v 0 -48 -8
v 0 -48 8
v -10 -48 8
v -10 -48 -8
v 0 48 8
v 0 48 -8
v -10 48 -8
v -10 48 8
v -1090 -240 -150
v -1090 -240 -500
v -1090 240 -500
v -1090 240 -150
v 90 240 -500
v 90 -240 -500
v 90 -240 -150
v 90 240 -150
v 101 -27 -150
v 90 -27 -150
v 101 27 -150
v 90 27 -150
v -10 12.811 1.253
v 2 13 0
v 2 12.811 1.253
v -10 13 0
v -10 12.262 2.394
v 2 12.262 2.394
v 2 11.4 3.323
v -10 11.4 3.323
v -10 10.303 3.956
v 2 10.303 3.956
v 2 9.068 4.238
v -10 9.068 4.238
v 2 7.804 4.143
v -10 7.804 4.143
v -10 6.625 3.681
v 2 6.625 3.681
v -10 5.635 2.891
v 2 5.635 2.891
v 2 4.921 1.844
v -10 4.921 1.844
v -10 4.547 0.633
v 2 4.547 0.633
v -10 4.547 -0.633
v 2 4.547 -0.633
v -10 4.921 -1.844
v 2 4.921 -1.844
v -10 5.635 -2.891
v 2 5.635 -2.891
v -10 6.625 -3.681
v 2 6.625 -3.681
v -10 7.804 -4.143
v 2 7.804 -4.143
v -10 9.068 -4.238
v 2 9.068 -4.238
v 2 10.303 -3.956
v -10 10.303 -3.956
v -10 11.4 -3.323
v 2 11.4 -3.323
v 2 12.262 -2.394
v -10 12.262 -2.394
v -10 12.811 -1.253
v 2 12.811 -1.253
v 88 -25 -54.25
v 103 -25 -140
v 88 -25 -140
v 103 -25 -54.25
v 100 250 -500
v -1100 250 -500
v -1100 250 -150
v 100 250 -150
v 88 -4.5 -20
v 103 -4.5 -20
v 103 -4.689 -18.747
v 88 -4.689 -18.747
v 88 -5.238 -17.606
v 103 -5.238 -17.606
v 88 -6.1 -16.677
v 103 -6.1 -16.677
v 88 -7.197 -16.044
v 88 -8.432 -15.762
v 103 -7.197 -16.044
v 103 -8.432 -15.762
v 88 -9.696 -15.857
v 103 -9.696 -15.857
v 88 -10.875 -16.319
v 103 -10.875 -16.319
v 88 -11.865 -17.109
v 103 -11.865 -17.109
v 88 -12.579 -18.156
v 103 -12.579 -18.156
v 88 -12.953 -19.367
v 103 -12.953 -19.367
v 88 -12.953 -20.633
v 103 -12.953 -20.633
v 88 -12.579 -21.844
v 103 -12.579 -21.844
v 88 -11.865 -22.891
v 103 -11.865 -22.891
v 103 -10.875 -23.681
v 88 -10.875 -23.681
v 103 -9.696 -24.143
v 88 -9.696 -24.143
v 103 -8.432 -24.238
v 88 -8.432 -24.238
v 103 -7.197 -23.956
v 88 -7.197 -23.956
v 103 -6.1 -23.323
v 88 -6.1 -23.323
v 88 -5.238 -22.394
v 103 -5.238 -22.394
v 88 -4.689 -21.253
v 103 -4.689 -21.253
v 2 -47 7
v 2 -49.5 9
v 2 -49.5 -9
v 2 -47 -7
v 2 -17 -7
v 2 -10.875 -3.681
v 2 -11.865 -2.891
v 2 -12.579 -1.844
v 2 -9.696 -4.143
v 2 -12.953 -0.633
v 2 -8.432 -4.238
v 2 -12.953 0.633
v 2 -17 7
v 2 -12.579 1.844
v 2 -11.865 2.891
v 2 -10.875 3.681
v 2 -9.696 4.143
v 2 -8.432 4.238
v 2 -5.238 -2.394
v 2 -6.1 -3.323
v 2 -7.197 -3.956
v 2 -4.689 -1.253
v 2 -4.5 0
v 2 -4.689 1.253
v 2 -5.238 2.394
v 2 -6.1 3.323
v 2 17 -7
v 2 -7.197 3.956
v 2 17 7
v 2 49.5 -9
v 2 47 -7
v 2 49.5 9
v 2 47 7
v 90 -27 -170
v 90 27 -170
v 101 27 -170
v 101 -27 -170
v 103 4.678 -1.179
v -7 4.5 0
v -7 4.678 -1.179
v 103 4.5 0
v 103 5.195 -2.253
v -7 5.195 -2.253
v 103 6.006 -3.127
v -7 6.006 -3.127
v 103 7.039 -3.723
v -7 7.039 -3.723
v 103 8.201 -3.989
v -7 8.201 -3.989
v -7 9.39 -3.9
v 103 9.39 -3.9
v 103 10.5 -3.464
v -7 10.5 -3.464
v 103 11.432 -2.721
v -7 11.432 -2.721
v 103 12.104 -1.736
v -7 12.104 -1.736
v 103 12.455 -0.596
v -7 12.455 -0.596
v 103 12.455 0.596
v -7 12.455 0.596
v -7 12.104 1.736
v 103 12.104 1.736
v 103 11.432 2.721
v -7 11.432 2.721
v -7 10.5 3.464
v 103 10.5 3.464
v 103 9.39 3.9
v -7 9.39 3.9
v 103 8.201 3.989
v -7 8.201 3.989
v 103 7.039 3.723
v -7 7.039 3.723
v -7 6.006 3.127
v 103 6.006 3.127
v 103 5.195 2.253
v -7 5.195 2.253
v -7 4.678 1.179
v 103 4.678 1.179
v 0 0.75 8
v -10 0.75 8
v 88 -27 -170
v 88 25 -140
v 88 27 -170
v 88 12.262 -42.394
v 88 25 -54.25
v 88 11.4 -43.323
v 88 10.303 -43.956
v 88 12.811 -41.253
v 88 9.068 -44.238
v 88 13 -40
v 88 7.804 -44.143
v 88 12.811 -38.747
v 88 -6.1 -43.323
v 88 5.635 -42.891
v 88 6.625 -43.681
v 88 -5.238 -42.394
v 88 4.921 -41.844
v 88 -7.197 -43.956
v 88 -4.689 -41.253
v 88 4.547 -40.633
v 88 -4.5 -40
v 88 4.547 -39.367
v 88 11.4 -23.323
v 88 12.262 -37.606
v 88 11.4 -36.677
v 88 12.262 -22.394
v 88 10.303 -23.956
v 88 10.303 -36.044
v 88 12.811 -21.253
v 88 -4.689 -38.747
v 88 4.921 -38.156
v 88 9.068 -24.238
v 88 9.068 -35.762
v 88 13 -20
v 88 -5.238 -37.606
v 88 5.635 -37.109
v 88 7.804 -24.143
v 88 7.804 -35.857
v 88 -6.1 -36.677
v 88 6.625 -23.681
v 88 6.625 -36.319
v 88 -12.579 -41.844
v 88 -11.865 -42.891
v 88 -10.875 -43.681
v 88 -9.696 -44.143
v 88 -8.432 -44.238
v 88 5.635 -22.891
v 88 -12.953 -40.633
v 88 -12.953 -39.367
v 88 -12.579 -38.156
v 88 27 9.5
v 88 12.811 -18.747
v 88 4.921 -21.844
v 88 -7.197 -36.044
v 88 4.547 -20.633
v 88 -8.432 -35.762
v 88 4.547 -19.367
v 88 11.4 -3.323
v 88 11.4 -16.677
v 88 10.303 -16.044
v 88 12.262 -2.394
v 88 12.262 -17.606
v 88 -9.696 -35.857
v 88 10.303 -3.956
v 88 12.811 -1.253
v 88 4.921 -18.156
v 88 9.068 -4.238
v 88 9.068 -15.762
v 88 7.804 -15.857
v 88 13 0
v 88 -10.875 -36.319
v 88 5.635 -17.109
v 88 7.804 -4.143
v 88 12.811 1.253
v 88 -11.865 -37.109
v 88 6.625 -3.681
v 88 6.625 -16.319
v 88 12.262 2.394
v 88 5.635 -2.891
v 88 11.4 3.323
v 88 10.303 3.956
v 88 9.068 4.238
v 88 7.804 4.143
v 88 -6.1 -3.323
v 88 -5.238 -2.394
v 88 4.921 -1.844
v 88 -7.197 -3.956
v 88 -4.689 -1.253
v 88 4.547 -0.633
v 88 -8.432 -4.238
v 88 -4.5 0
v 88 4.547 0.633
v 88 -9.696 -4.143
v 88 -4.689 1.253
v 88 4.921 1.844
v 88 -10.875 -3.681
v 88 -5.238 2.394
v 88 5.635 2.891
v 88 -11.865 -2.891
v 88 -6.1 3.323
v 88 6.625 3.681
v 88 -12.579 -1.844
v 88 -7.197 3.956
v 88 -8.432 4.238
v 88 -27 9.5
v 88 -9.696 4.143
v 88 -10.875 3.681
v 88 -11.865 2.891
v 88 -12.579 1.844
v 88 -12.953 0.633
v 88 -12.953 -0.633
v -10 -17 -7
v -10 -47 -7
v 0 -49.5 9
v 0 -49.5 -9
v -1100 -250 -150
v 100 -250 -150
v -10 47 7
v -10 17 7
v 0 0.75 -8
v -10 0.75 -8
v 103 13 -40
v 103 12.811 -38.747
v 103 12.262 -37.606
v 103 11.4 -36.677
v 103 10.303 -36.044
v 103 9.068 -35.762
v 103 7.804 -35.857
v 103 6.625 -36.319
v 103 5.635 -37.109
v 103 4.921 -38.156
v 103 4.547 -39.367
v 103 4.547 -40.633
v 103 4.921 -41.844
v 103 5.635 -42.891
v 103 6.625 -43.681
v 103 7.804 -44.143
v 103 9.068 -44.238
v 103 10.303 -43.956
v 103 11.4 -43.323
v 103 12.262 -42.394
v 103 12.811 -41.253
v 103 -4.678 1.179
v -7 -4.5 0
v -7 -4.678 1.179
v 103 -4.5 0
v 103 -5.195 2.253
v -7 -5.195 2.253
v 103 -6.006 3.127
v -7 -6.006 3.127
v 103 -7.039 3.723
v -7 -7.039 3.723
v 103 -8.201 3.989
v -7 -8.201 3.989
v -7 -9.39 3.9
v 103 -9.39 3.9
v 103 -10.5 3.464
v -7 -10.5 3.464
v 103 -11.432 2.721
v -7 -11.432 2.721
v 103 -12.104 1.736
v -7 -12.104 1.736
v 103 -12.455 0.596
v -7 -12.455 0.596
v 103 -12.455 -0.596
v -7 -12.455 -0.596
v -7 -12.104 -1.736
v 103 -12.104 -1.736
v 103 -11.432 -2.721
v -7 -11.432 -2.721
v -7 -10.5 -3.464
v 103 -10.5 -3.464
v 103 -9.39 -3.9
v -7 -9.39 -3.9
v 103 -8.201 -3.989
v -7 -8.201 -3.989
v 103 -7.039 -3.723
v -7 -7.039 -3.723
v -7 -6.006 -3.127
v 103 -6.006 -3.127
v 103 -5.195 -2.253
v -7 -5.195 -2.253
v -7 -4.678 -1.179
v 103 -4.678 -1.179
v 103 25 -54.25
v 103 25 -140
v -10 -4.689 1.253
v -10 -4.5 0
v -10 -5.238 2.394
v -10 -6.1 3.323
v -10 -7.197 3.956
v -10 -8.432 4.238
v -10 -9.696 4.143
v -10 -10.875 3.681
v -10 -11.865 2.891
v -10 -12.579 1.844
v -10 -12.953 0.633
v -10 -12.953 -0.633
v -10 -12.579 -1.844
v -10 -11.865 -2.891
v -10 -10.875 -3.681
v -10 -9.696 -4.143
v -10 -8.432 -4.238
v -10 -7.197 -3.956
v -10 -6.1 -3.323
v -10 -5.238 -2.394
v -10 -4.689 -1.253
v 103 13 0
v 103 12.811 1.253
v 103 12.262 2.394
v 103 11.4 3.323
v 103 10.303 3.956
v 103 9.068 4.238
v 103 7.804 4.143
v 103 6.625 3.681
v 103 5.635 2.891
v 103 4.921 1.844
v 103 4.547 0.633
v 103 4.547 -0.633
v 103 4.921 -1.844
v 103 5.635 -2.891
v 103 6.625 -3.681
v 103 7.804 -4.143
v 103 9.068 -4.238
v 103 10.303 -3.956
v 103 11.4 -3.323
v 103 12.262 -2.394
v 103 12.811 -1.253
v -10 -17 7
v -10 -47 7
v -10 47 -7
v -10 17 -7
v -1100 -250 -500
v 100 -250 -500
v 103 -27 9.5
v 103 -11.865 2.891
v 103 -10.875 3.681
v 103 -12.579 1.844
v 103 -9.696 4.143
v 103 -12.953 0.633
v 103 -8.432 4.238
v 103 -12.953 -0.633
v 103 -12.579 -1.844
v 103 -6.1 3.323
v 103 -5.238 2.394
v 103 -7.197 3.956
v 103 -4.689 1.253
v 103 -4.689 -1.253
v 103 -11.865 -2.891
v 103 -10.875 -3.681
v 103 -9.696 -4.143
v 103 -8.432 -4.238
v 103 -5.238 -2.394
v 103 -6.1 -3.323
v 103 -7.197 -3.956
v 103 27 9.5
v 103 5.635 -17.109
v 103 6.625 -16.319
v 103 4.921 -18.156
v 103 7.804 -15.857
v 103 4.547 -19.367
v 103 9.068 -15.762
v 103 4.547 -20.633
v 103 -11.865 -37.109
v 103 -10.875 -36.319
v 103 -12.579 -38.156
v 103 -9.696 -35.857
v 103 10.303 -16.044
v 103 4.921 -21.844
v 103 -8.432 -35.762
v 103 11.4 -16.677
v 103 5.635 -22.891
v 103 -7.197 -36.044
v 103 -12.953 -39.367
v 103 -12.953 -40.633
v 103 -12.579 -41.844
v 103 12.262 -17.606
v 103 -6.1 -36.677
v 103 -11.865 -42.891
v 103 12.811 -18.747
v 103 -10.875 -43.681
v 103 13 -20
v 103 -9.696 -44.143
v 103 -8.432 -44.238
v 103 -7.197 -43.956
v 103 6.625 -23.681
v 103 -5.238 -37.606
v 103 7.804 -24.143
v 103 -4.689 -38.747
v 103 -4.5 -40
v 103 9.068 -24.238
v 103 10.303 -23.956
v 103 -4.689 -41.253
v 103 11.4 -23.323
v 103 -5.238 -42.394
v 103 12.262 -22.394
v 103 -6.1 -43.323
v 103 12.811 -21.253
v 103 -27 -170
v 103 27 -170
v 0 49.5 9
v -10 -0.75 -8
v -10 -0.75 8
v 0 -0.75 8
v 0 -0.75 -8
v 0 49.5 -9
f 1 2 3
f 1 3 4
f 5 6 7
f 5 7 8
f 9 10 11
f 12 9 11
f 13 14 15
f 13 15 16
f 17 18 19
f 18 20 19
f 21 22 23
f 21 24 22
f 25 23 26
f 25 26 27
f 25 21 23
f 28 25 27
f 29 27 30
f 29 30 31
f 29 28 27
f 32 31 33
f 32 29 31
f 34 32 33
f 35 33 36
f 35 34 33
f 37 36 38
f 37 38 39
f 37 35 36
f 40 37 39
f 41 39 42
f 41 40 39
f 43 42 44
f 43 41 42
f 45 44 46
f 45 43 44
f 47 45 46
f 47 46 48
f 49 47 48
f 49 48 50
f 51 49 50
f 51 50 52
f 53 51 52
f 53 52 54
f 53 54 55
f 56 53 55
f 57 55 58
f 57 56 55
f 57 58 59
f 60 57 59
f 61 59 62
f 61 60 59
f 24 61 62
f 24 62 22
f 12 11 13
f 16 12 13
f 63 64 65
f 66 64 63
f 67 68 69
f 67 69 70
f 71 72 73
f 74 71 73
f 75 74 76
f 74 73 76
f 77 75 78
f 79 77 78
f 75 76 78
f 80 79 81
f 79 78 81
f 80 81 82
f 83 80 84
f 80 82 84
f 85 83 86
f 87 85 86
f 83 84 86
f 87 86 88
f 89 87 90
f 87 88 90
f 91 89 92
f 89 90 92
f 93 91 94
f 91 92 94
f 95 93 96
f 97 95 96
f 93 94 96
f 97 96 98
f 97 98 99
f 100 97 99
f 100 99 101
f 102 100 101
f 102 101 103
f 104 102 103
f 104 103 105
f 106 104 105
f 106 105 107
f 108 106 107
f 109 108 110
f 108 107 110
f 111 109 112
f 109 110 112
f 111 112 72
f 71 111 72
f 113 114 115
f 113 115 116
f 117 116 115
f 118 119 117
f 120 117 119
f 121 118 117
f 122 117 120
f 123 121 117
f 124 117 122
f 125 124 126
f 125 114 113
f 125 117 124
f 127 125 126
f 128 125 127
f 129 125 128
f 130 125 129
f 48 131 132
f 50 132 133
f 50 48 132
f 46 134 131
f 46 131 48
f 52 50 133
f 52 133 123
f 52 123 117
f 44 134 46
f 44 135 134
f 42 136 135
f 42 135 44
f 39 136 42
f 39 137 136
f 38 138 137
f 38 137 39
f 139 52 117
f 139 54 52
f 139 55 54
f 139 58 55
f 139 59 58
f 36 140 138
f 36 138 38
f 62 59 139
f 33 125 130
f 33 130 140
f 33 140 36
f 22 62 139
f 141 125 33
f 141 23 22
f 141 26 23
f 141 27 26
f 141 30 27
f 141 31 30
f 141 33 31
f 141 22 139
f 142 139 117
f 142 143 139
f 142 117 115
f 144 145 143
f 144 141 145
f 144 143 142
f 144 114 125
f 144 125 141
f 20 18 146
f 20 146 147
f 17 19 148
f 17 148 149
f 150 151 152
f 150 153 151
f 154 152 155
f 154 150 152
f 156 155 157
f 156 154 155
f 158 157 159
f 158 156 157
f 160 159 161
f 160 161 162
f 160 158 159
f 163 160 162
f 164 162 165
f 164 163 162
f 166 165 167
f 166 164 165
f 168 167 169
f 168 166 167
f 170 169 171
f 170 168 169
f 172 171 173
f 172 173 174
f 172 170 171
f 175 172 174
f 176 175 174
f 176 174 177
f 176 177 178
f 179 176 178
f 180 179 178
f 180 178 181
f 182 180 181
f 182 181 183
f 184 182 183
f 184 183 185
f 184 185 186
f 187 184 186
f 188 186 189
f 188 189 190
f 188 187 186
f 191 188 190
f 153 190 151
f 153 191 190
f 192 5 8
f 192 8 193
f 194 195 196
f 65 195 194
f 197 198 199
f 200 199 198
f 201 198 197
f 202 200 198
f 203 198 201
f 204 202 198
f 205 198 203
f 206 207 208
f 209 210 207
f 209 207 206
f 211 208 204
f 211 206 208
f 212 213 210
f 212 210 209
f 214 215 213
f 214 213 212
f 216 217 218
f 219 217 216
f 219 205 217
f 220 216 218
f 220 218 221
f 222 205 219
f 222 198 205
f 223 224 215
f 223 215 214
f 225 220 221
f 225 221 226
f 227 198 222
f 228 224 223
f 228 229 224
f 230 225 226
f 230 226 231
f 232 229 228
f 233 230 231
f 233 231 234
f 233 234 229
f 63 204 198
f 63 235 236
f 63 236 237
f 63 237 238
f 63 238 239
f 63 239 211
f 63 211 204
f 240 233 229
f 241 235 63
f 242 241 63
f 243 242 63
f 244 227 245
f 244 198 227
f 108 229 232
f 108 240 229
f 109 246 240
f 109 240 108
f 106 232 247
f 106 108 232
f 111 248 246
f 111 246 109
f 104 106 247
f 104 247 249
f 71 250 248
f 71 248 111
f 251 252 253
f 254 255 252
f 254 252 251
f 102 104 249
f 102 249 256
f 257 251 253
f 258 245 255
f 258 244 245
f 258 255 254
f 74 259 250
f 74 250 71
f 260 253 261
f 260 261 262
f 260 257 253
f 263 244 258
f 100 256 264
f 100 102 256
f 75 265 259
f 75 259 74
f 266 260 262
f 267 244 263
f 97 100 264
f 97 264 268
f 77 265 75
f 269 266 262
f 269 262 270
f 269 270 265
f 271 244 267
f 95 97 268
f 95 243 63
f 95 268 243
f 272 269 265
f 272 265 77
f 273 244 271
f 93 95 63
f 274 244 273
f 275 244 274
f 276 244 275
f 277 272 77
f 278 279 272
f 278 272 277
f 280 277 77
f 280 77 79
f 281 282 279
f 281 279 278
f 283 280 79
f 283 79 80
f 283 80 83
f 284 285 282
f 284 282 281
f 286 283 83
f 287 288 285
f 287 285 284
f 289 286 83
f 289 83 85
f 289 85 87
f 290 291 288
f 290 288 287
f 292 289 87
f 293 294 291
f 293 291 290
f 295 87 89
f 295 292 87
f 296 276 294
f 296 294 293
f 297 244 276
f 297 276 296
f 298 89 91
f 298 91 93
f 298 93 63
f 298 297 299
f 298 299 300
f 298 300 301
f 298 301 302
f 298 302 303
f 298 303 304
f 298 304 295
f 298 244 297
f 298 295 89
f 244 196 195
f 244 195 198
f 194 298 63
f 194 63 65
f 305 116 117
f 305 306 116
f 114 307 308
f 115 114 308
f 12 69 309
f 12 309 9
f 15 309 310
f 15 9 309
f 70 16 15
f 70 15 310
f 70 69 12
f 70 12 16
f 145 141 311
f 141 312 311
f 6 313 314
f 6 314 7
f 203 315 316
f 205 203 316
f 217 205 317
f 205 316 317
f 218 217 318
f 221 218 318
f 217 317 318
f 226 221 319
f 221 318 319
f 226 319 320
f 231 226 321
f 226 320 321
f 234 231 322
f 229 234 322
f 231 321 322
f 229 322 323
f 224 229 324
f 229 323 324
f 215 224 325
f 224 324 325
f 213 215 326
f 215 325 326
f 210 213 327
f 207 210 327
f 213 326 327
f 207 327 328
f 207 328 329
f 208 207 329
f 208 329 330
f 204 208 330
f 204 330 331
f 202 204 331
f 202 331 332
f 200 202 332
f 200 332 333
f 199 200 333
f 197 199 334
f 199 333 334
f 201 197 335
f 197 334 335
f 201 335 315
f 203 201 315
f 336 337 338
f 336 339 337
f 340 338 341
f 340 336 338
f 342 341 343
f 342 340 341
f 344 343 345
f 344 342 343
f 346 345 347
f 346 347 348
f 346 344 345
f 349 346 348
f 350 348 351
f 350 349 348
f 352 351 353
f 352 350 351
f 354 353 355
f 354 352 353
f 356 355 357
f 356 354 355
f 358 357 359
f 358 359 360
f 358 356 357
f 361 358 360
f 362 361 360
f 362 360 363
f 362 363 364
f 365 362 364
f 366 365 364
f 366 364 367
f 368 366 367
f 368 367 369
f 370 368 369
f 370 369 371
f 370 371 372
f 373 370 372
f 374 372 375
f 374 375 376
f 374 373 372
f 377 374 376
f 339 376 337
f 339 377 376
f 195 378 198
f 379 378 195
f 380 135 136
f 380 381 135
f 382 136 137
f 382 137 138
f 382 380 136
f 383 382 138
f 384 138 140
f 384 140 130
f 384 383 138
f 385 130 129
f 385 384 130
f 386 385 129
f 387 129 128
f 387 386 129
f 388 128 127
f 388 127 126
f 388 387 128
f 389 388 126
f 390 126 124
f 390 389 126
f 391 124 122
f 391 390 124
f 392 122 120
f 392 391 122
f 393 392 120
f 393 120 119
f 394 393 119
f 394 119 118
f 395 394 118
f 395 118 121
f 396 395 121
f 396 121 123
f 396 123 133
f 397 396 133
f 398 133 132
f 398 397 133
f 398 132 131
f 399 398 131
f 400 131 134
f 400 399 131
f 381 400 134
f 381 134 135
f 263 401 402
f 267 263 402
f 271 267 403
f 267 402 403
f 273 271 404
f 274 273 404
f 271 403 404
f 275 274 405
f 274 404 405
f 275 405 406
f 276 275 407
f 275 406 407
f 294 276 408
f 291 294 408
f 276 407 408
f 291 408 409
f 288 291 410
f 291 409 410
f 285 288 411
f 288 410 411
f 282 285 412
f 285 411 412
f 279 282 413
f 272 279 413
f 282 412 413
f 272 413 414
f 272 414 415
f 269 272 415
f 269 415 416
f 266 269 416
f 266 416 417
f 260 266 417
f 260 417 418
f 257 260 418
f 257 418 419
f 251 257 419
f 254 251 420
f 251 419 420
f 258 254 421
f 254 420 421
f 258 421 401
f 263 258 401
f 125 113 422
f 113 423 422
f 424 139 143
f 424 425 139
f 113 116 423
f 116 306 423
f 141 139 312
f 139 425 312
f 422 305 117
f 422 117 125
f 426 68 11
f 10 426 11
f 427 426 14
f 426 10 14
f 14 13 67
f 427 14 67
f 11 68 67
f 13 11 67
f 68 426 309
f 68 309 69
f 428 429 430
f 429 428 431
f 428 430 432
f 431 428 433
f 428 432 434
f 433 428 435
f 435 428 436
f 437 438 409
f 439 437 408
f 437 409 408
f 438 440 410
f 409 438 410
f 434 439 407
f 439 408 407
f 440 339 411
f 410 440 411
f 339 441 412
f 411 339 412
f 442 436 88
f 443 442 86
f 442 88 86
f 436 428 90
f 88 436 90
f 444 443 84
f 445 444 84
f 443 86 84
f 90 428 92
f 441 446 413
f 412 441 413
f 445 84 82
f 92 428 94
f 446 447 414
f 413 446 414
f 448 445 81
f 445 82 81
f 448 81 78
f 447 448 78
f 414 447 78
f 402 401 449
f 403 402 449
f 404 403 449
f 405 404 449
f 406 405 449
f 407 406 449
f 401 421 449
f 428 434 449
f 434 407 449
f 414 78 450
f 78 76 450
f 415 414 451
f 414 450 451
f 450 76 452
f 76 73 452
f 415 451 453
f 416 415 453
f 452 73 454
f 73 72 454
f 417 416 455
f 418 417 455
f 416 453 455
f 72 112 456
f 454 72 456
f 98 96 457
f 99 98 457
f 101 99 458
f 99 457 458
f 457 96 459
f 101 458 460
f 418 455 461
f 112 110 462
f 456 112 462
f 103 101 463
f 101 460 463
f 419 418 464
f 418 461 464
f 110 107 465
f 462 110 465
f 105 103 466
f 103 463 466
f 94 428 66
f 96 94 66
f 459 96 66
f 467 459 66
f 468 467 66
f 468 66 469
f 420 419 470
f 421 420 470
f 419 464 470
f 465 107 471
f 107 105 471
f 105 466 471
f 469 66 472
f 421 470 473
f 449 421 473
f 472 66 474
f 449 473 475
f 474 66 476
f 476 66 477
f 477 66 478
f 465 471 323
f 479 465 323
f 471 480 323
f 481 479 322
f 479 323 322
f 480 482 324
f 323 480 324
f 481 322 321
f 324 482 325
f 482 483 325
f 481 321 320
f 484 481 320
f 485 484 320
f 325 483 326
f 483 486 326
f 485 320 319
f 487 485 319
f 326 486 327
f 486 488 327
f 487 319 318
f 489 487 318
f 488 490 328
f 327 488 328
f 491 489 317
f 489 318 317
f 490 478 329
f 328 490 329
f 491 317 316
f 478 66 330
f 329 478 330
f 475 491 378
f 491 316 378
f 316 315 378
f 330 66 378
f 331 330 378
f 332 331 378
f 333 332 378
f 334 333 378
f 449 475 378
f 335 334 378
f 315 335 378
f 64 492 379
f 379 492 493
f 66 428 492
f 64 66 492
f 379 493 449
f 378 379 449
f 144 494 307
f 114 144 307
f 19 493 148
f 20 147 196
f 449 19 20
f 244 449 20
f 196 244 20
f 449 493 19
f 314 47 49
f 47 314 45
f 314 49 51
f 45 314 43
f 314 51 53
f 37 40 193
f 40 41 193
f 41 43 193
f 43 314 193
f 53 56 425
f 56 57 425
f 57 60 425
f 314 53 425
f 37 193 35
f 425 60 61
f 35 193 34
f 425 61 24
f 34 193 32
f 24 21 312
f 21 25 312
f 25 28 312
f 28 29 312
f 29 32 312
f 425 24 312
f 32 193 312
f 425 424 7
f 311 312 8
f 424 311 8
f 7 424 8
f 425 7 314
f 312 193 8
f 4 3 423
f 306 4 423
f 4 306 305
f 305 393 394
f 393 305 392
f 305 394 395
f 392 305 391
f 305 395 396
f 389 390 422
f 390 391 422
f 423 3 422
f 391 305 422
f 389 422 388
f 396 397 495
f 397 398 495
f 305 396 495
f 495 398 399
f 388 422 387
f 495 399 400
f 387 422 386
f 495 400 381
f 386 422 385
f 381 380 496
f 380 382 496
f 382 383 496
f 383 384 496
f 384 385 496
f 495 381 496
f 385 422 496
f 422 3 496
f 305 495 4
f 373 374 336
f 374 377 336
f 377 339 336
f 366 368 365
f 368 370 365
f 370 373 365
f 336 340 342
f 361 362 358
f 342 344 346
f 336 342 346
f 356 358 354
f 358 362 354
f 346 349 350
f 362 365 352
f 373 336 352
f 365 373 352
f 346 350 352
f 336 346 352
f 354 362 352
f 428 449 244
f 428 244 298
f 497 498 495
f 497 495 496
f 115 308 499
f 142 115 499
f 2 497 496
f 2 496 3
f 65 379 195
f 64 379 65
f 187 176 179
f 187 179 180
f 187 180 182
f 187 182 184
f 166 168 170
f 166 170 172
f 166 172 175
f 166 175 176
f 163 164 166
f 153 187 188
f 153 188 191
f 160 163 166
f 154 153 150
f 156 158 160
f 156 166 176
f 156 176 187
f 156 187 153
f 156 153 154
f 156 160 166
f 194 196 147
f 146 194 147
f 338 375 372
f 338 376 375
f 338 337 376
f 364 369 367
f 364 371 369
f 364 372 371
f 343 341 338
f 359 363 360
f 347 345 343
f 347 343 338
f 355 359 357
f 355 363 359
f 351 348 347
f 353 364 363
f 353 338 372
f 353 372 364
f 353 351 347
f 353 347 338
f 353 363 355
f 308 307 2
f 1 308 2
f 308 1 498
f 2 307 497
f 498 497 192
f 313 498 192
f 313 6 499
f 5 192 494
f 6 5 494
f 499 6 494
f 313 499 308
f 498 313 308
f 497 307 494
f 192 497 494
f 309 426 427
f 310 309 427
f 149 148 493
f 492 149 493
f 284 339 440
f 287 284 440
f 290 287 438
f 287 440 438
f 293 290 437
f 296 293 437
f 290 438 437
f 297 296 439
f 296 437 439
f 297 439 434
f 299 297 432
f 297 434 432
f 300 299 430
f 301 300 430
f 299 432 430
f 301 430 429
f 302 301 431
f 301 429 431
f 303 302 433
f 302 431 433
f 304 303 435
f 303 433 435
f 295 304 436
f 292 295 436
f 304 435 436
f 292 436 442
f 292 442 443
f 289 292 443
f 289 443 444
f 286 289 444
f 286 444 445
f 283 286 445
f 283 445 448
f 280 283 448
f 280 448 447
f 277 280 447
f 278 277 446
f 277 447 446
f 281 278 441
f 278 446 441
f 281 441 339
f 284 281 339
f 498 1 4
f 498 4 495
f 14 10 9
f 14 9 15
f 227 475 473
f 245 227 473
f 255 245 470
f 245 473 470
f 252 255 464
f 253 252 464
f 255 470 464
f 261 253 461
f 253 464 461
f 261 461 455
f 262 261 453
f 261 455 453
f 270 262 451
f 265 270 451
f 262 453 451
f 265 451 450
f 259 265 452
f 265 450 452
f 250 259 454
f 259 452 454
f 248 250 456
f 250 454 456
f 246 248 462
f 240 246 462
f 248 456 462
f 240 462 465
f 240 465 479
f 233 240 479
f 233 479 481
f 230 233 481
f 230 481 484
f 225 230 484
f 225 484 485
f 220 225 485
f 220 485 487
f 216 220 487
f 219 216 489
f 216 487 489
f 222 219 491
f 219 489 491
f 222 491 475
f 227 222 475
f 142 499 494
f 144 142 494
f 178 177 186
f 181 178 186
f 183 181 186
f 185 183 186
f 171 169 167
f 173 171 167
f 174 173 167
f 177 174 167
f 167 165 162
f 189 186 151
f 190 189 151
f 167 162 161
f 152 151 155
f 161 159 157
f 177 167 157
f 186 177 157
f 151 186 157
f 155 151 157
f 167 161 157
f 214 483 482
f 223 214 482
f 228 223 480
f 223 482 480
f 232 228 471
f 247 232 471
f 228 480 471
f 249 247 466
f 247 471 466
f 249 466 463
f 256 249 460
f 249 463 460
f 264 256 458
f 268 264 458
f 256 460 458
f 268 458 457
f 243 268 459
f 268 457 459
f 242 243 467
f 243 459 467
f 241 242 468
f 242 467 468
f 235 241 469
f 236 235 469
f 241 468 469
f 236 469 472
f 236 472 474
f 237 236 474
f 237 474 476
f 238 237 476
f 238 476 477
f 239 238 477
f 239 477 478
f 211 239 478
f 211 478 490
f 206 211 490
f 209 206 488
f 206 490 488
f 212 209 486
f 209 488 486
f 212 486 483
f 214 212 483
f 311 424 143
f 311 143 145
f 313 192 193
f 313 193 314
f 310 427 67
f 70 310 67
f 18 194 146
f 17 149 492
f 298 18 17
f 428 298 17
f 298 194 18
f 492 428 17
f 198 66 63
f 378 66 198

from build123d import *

# Parameters (mm, degrees)
F0_W          = 1.5
F0_H          = 1
F0_H_2        = 16
F0_R          = 4.25
F0_W_2        = 30
F0_H_3        = 14
F1_DEPTH      = 2
F2_DEPTH      = 10
F2_DEPTH_BACK = 2
F5_W          = 1200
F5_H          = 500
F5_W_2        = 1180
F5_H_2        = 480
F6_DEPTH      = 350
F8_W          = 10
F8_H          = 2
F8_W_2        = 1
F8_H_2        = 50
F9_DEPTH      = 10
F10_DEPTH     = 20
F11_R         = 4.25
F12_DEPTH     = 15
F13_W         = 110
F13_H         = 4


# Not quite as in the source:
# - a feature names something its author has since deleted; it is built from what else it names
# - the program builds the solid bodies; features that only make, move or delete a surface that nothing else refers to are left out


with BuildPart() as f1:
    # F0 (on Right) → F1 (new body)
    with BuildSketch(Plane.YZ):
        Polygon((-0.75, 9), (-49.5, 9), (-49.5, -9), (-0.75, -9), (-0.75, -8), (-13, -8), (-16, -8), (-48, -8), (-48, 8), (-16, 8), (-13, 8), (-0.75, 8), align=None)
        with Locations((0, 8.5)):
            Rectangle(F0_W, F0_H)
        Polygon((49.5, 9), (0.75, 9), (0.75, 8), (13, 8), (16, 8), (48, 8), (48, -8), (16, -8), (13, -8), (0.75, -8), (0.75, -9), (49.5, -9), align=None)
        with Locations((0, -8.5)):
            Rectangle(F0_W, F0_H)
        Rectangle(F0_W, F0_H_2)
        Polygon((13, 8), (0.75, 8), (0.75, -8), (13, -8), (16, -8), (48, -8), (48, 8), (16, 8), align=None)
        with Locations((8.75, 0)):
            Circle(F0_R, mode=Mode.SUBTRACT)
        with Locations((32, 0)):
            Rectangle(F0_W_2, F0_H_3, mode=Mode.SUBTRACT)
    extrude(amount=F1_DEPTH)

    # F0 (on Right) → F2 (join, two sides)
    with BuildSketch(Plane.YZ) as f2_sk:
        Polygon((-0.75, -8), (-0.75, 8), (-13, 8), (-16, 8), (-48, 8), (-48, -8), (-16, -8), (-13, -8), align=None)
        with Locations((-32, 0)):
            Rectangle(F0_W_2, F0_H_3, mode=Mode.SUBTRACT)
        with Locations((-8.75, 0)):
            Circle(F0_R, mode=Mode.SUBTRACT)
        Polygon((13, 8), (0.75, 8), (0.75, -8), (13, -8), (16, -8), (48, -8), (48, 8), (16, 8), align=None)
        with Locations((8.75, 0)):
            Circle(F0_R, mode=Mode.SUBTRACT)
        with Locations((32, 0)):
            Rectangle(F0_W_2, F0_H_3, mode=Mode.SUBTRACT)
    extrude(amount=-F2_DEPTH)
    extrude(f2_sk.sketch, amount=F2_DEPTH_BACK)


with BuildPart() as f6:
    # F5 (on offset) → F6 (new body)
    with BuildSketch(Plane.XY.offset(-500)):
        with Locations((-500, 0)):
            Rectangle(F5_W, F5_H)
        with Locations((-500, 0)):
            Rectangle(F5_W_2, F5_H_2, mode=Mode.SUBTRACT)
    extrude(amount=F6_DEPTH)


with BuildPart() as f9:
    # F8 (on face) → F9 (new body)
    with BuildSketch(Plane.XY.offset(-150)):
        Polygon((101, 27), (101, 25), (101, -25), (101, -27), (103, -27), (103, 27), align=None)
        Polygon((90, -25), (90, 25), (90, 27), (88, 27), (88, -27), (90, -27), align=None)
        with Locations((95, 26)):
            Rectangle(F8_W, F8_H)
        with Locations((100.5, 26)):
            Rectangle(F8_W_2, F8_H)
        with Locations((100.5, -26)):
            Rectangle(F8_W_2, F8_H)
        with Locations((95, -26)):
            Rectangle(F8_W, F8_H)
        with Locations((100.5, 0)):
            Rectangle(F8_W_2, F8_H_2)
        with Locations((95, 0)):
            Rectangle(F8_W, F8_H_2)
    extrude(amount=F9_DEPTH)

    # F8 (on face) → F10 (join)
    with BuildSketch(Plane.XY.offset(-150)):
        Polygon((90, -25), (90, 25), (90, 27), (88, 27), (88, -27), (90, -27), align=None)
        Polygon((101, 27), (101, 25), (101, -25), (101, -27), (103, -27), (103, 27), align=None)
    extrude(amount=-F10_DEPTH)

    # F11 (on face) → F12 (join)
    with BuildSketch(Plane.YZ.offset(103)):
        Polygon((-25, -140), (-27, -140), (-27, -150), (27, -150), (27, -140), (25, -140), align=None)
        Polygon((-27, 9.5), (-27, -140), (-25, -140), (-25, -54.25), (25, -54.25), (25, -140), (27, -140), (27, 9.5), align=None)
        with Locations((-8.75, -40)):
            Circle(F11_R, mode=Mode.SUBTRACT)
        with Locations((-8.75, -20)):
            Circle(F11_R, mode=Mode.SUBTRACT)
        with Locations((-8.75, 0)):
            Circle(F11_R, mode=Mode.SUBTRACT)
        with Locations((8.75, -40)):
            Circle(F11_R, mode=Mode.SUBTRACT)
        with Locations((8.75, -20)):
            Circle(F11_R, mode=Mode.SUBTRACT)
        with Locations((8.75, 0)):
            Circle(F11_R, mode=Mode.SUBTRACT)
    extrude(amount=-F12_DEPTH)


with BuildPart() as f14:
    # F13 (on Top) → F14 (revolve)
    with BuildSketch(Plane.XY):
        with Locations((48, -6.5)):
            Rectangle(F13_W, F13_H)
    revolve(axis=Axis((48, -8.5, 0), (1, 0, 0)))


with BuildPart() as f15:
    # F13 (on Top) → F15 (revolve)
    with BuildSketch(Plane.XY):
        with Locations((48, 6.5)):
            Rectangle(F13_W, F13_H)
    revolve(axis=Axis((48, 8.5, 0), (1, 0, 0)))


solid = Compound([f1.part, f6.part, f9.part, f14.part, f15.part])
